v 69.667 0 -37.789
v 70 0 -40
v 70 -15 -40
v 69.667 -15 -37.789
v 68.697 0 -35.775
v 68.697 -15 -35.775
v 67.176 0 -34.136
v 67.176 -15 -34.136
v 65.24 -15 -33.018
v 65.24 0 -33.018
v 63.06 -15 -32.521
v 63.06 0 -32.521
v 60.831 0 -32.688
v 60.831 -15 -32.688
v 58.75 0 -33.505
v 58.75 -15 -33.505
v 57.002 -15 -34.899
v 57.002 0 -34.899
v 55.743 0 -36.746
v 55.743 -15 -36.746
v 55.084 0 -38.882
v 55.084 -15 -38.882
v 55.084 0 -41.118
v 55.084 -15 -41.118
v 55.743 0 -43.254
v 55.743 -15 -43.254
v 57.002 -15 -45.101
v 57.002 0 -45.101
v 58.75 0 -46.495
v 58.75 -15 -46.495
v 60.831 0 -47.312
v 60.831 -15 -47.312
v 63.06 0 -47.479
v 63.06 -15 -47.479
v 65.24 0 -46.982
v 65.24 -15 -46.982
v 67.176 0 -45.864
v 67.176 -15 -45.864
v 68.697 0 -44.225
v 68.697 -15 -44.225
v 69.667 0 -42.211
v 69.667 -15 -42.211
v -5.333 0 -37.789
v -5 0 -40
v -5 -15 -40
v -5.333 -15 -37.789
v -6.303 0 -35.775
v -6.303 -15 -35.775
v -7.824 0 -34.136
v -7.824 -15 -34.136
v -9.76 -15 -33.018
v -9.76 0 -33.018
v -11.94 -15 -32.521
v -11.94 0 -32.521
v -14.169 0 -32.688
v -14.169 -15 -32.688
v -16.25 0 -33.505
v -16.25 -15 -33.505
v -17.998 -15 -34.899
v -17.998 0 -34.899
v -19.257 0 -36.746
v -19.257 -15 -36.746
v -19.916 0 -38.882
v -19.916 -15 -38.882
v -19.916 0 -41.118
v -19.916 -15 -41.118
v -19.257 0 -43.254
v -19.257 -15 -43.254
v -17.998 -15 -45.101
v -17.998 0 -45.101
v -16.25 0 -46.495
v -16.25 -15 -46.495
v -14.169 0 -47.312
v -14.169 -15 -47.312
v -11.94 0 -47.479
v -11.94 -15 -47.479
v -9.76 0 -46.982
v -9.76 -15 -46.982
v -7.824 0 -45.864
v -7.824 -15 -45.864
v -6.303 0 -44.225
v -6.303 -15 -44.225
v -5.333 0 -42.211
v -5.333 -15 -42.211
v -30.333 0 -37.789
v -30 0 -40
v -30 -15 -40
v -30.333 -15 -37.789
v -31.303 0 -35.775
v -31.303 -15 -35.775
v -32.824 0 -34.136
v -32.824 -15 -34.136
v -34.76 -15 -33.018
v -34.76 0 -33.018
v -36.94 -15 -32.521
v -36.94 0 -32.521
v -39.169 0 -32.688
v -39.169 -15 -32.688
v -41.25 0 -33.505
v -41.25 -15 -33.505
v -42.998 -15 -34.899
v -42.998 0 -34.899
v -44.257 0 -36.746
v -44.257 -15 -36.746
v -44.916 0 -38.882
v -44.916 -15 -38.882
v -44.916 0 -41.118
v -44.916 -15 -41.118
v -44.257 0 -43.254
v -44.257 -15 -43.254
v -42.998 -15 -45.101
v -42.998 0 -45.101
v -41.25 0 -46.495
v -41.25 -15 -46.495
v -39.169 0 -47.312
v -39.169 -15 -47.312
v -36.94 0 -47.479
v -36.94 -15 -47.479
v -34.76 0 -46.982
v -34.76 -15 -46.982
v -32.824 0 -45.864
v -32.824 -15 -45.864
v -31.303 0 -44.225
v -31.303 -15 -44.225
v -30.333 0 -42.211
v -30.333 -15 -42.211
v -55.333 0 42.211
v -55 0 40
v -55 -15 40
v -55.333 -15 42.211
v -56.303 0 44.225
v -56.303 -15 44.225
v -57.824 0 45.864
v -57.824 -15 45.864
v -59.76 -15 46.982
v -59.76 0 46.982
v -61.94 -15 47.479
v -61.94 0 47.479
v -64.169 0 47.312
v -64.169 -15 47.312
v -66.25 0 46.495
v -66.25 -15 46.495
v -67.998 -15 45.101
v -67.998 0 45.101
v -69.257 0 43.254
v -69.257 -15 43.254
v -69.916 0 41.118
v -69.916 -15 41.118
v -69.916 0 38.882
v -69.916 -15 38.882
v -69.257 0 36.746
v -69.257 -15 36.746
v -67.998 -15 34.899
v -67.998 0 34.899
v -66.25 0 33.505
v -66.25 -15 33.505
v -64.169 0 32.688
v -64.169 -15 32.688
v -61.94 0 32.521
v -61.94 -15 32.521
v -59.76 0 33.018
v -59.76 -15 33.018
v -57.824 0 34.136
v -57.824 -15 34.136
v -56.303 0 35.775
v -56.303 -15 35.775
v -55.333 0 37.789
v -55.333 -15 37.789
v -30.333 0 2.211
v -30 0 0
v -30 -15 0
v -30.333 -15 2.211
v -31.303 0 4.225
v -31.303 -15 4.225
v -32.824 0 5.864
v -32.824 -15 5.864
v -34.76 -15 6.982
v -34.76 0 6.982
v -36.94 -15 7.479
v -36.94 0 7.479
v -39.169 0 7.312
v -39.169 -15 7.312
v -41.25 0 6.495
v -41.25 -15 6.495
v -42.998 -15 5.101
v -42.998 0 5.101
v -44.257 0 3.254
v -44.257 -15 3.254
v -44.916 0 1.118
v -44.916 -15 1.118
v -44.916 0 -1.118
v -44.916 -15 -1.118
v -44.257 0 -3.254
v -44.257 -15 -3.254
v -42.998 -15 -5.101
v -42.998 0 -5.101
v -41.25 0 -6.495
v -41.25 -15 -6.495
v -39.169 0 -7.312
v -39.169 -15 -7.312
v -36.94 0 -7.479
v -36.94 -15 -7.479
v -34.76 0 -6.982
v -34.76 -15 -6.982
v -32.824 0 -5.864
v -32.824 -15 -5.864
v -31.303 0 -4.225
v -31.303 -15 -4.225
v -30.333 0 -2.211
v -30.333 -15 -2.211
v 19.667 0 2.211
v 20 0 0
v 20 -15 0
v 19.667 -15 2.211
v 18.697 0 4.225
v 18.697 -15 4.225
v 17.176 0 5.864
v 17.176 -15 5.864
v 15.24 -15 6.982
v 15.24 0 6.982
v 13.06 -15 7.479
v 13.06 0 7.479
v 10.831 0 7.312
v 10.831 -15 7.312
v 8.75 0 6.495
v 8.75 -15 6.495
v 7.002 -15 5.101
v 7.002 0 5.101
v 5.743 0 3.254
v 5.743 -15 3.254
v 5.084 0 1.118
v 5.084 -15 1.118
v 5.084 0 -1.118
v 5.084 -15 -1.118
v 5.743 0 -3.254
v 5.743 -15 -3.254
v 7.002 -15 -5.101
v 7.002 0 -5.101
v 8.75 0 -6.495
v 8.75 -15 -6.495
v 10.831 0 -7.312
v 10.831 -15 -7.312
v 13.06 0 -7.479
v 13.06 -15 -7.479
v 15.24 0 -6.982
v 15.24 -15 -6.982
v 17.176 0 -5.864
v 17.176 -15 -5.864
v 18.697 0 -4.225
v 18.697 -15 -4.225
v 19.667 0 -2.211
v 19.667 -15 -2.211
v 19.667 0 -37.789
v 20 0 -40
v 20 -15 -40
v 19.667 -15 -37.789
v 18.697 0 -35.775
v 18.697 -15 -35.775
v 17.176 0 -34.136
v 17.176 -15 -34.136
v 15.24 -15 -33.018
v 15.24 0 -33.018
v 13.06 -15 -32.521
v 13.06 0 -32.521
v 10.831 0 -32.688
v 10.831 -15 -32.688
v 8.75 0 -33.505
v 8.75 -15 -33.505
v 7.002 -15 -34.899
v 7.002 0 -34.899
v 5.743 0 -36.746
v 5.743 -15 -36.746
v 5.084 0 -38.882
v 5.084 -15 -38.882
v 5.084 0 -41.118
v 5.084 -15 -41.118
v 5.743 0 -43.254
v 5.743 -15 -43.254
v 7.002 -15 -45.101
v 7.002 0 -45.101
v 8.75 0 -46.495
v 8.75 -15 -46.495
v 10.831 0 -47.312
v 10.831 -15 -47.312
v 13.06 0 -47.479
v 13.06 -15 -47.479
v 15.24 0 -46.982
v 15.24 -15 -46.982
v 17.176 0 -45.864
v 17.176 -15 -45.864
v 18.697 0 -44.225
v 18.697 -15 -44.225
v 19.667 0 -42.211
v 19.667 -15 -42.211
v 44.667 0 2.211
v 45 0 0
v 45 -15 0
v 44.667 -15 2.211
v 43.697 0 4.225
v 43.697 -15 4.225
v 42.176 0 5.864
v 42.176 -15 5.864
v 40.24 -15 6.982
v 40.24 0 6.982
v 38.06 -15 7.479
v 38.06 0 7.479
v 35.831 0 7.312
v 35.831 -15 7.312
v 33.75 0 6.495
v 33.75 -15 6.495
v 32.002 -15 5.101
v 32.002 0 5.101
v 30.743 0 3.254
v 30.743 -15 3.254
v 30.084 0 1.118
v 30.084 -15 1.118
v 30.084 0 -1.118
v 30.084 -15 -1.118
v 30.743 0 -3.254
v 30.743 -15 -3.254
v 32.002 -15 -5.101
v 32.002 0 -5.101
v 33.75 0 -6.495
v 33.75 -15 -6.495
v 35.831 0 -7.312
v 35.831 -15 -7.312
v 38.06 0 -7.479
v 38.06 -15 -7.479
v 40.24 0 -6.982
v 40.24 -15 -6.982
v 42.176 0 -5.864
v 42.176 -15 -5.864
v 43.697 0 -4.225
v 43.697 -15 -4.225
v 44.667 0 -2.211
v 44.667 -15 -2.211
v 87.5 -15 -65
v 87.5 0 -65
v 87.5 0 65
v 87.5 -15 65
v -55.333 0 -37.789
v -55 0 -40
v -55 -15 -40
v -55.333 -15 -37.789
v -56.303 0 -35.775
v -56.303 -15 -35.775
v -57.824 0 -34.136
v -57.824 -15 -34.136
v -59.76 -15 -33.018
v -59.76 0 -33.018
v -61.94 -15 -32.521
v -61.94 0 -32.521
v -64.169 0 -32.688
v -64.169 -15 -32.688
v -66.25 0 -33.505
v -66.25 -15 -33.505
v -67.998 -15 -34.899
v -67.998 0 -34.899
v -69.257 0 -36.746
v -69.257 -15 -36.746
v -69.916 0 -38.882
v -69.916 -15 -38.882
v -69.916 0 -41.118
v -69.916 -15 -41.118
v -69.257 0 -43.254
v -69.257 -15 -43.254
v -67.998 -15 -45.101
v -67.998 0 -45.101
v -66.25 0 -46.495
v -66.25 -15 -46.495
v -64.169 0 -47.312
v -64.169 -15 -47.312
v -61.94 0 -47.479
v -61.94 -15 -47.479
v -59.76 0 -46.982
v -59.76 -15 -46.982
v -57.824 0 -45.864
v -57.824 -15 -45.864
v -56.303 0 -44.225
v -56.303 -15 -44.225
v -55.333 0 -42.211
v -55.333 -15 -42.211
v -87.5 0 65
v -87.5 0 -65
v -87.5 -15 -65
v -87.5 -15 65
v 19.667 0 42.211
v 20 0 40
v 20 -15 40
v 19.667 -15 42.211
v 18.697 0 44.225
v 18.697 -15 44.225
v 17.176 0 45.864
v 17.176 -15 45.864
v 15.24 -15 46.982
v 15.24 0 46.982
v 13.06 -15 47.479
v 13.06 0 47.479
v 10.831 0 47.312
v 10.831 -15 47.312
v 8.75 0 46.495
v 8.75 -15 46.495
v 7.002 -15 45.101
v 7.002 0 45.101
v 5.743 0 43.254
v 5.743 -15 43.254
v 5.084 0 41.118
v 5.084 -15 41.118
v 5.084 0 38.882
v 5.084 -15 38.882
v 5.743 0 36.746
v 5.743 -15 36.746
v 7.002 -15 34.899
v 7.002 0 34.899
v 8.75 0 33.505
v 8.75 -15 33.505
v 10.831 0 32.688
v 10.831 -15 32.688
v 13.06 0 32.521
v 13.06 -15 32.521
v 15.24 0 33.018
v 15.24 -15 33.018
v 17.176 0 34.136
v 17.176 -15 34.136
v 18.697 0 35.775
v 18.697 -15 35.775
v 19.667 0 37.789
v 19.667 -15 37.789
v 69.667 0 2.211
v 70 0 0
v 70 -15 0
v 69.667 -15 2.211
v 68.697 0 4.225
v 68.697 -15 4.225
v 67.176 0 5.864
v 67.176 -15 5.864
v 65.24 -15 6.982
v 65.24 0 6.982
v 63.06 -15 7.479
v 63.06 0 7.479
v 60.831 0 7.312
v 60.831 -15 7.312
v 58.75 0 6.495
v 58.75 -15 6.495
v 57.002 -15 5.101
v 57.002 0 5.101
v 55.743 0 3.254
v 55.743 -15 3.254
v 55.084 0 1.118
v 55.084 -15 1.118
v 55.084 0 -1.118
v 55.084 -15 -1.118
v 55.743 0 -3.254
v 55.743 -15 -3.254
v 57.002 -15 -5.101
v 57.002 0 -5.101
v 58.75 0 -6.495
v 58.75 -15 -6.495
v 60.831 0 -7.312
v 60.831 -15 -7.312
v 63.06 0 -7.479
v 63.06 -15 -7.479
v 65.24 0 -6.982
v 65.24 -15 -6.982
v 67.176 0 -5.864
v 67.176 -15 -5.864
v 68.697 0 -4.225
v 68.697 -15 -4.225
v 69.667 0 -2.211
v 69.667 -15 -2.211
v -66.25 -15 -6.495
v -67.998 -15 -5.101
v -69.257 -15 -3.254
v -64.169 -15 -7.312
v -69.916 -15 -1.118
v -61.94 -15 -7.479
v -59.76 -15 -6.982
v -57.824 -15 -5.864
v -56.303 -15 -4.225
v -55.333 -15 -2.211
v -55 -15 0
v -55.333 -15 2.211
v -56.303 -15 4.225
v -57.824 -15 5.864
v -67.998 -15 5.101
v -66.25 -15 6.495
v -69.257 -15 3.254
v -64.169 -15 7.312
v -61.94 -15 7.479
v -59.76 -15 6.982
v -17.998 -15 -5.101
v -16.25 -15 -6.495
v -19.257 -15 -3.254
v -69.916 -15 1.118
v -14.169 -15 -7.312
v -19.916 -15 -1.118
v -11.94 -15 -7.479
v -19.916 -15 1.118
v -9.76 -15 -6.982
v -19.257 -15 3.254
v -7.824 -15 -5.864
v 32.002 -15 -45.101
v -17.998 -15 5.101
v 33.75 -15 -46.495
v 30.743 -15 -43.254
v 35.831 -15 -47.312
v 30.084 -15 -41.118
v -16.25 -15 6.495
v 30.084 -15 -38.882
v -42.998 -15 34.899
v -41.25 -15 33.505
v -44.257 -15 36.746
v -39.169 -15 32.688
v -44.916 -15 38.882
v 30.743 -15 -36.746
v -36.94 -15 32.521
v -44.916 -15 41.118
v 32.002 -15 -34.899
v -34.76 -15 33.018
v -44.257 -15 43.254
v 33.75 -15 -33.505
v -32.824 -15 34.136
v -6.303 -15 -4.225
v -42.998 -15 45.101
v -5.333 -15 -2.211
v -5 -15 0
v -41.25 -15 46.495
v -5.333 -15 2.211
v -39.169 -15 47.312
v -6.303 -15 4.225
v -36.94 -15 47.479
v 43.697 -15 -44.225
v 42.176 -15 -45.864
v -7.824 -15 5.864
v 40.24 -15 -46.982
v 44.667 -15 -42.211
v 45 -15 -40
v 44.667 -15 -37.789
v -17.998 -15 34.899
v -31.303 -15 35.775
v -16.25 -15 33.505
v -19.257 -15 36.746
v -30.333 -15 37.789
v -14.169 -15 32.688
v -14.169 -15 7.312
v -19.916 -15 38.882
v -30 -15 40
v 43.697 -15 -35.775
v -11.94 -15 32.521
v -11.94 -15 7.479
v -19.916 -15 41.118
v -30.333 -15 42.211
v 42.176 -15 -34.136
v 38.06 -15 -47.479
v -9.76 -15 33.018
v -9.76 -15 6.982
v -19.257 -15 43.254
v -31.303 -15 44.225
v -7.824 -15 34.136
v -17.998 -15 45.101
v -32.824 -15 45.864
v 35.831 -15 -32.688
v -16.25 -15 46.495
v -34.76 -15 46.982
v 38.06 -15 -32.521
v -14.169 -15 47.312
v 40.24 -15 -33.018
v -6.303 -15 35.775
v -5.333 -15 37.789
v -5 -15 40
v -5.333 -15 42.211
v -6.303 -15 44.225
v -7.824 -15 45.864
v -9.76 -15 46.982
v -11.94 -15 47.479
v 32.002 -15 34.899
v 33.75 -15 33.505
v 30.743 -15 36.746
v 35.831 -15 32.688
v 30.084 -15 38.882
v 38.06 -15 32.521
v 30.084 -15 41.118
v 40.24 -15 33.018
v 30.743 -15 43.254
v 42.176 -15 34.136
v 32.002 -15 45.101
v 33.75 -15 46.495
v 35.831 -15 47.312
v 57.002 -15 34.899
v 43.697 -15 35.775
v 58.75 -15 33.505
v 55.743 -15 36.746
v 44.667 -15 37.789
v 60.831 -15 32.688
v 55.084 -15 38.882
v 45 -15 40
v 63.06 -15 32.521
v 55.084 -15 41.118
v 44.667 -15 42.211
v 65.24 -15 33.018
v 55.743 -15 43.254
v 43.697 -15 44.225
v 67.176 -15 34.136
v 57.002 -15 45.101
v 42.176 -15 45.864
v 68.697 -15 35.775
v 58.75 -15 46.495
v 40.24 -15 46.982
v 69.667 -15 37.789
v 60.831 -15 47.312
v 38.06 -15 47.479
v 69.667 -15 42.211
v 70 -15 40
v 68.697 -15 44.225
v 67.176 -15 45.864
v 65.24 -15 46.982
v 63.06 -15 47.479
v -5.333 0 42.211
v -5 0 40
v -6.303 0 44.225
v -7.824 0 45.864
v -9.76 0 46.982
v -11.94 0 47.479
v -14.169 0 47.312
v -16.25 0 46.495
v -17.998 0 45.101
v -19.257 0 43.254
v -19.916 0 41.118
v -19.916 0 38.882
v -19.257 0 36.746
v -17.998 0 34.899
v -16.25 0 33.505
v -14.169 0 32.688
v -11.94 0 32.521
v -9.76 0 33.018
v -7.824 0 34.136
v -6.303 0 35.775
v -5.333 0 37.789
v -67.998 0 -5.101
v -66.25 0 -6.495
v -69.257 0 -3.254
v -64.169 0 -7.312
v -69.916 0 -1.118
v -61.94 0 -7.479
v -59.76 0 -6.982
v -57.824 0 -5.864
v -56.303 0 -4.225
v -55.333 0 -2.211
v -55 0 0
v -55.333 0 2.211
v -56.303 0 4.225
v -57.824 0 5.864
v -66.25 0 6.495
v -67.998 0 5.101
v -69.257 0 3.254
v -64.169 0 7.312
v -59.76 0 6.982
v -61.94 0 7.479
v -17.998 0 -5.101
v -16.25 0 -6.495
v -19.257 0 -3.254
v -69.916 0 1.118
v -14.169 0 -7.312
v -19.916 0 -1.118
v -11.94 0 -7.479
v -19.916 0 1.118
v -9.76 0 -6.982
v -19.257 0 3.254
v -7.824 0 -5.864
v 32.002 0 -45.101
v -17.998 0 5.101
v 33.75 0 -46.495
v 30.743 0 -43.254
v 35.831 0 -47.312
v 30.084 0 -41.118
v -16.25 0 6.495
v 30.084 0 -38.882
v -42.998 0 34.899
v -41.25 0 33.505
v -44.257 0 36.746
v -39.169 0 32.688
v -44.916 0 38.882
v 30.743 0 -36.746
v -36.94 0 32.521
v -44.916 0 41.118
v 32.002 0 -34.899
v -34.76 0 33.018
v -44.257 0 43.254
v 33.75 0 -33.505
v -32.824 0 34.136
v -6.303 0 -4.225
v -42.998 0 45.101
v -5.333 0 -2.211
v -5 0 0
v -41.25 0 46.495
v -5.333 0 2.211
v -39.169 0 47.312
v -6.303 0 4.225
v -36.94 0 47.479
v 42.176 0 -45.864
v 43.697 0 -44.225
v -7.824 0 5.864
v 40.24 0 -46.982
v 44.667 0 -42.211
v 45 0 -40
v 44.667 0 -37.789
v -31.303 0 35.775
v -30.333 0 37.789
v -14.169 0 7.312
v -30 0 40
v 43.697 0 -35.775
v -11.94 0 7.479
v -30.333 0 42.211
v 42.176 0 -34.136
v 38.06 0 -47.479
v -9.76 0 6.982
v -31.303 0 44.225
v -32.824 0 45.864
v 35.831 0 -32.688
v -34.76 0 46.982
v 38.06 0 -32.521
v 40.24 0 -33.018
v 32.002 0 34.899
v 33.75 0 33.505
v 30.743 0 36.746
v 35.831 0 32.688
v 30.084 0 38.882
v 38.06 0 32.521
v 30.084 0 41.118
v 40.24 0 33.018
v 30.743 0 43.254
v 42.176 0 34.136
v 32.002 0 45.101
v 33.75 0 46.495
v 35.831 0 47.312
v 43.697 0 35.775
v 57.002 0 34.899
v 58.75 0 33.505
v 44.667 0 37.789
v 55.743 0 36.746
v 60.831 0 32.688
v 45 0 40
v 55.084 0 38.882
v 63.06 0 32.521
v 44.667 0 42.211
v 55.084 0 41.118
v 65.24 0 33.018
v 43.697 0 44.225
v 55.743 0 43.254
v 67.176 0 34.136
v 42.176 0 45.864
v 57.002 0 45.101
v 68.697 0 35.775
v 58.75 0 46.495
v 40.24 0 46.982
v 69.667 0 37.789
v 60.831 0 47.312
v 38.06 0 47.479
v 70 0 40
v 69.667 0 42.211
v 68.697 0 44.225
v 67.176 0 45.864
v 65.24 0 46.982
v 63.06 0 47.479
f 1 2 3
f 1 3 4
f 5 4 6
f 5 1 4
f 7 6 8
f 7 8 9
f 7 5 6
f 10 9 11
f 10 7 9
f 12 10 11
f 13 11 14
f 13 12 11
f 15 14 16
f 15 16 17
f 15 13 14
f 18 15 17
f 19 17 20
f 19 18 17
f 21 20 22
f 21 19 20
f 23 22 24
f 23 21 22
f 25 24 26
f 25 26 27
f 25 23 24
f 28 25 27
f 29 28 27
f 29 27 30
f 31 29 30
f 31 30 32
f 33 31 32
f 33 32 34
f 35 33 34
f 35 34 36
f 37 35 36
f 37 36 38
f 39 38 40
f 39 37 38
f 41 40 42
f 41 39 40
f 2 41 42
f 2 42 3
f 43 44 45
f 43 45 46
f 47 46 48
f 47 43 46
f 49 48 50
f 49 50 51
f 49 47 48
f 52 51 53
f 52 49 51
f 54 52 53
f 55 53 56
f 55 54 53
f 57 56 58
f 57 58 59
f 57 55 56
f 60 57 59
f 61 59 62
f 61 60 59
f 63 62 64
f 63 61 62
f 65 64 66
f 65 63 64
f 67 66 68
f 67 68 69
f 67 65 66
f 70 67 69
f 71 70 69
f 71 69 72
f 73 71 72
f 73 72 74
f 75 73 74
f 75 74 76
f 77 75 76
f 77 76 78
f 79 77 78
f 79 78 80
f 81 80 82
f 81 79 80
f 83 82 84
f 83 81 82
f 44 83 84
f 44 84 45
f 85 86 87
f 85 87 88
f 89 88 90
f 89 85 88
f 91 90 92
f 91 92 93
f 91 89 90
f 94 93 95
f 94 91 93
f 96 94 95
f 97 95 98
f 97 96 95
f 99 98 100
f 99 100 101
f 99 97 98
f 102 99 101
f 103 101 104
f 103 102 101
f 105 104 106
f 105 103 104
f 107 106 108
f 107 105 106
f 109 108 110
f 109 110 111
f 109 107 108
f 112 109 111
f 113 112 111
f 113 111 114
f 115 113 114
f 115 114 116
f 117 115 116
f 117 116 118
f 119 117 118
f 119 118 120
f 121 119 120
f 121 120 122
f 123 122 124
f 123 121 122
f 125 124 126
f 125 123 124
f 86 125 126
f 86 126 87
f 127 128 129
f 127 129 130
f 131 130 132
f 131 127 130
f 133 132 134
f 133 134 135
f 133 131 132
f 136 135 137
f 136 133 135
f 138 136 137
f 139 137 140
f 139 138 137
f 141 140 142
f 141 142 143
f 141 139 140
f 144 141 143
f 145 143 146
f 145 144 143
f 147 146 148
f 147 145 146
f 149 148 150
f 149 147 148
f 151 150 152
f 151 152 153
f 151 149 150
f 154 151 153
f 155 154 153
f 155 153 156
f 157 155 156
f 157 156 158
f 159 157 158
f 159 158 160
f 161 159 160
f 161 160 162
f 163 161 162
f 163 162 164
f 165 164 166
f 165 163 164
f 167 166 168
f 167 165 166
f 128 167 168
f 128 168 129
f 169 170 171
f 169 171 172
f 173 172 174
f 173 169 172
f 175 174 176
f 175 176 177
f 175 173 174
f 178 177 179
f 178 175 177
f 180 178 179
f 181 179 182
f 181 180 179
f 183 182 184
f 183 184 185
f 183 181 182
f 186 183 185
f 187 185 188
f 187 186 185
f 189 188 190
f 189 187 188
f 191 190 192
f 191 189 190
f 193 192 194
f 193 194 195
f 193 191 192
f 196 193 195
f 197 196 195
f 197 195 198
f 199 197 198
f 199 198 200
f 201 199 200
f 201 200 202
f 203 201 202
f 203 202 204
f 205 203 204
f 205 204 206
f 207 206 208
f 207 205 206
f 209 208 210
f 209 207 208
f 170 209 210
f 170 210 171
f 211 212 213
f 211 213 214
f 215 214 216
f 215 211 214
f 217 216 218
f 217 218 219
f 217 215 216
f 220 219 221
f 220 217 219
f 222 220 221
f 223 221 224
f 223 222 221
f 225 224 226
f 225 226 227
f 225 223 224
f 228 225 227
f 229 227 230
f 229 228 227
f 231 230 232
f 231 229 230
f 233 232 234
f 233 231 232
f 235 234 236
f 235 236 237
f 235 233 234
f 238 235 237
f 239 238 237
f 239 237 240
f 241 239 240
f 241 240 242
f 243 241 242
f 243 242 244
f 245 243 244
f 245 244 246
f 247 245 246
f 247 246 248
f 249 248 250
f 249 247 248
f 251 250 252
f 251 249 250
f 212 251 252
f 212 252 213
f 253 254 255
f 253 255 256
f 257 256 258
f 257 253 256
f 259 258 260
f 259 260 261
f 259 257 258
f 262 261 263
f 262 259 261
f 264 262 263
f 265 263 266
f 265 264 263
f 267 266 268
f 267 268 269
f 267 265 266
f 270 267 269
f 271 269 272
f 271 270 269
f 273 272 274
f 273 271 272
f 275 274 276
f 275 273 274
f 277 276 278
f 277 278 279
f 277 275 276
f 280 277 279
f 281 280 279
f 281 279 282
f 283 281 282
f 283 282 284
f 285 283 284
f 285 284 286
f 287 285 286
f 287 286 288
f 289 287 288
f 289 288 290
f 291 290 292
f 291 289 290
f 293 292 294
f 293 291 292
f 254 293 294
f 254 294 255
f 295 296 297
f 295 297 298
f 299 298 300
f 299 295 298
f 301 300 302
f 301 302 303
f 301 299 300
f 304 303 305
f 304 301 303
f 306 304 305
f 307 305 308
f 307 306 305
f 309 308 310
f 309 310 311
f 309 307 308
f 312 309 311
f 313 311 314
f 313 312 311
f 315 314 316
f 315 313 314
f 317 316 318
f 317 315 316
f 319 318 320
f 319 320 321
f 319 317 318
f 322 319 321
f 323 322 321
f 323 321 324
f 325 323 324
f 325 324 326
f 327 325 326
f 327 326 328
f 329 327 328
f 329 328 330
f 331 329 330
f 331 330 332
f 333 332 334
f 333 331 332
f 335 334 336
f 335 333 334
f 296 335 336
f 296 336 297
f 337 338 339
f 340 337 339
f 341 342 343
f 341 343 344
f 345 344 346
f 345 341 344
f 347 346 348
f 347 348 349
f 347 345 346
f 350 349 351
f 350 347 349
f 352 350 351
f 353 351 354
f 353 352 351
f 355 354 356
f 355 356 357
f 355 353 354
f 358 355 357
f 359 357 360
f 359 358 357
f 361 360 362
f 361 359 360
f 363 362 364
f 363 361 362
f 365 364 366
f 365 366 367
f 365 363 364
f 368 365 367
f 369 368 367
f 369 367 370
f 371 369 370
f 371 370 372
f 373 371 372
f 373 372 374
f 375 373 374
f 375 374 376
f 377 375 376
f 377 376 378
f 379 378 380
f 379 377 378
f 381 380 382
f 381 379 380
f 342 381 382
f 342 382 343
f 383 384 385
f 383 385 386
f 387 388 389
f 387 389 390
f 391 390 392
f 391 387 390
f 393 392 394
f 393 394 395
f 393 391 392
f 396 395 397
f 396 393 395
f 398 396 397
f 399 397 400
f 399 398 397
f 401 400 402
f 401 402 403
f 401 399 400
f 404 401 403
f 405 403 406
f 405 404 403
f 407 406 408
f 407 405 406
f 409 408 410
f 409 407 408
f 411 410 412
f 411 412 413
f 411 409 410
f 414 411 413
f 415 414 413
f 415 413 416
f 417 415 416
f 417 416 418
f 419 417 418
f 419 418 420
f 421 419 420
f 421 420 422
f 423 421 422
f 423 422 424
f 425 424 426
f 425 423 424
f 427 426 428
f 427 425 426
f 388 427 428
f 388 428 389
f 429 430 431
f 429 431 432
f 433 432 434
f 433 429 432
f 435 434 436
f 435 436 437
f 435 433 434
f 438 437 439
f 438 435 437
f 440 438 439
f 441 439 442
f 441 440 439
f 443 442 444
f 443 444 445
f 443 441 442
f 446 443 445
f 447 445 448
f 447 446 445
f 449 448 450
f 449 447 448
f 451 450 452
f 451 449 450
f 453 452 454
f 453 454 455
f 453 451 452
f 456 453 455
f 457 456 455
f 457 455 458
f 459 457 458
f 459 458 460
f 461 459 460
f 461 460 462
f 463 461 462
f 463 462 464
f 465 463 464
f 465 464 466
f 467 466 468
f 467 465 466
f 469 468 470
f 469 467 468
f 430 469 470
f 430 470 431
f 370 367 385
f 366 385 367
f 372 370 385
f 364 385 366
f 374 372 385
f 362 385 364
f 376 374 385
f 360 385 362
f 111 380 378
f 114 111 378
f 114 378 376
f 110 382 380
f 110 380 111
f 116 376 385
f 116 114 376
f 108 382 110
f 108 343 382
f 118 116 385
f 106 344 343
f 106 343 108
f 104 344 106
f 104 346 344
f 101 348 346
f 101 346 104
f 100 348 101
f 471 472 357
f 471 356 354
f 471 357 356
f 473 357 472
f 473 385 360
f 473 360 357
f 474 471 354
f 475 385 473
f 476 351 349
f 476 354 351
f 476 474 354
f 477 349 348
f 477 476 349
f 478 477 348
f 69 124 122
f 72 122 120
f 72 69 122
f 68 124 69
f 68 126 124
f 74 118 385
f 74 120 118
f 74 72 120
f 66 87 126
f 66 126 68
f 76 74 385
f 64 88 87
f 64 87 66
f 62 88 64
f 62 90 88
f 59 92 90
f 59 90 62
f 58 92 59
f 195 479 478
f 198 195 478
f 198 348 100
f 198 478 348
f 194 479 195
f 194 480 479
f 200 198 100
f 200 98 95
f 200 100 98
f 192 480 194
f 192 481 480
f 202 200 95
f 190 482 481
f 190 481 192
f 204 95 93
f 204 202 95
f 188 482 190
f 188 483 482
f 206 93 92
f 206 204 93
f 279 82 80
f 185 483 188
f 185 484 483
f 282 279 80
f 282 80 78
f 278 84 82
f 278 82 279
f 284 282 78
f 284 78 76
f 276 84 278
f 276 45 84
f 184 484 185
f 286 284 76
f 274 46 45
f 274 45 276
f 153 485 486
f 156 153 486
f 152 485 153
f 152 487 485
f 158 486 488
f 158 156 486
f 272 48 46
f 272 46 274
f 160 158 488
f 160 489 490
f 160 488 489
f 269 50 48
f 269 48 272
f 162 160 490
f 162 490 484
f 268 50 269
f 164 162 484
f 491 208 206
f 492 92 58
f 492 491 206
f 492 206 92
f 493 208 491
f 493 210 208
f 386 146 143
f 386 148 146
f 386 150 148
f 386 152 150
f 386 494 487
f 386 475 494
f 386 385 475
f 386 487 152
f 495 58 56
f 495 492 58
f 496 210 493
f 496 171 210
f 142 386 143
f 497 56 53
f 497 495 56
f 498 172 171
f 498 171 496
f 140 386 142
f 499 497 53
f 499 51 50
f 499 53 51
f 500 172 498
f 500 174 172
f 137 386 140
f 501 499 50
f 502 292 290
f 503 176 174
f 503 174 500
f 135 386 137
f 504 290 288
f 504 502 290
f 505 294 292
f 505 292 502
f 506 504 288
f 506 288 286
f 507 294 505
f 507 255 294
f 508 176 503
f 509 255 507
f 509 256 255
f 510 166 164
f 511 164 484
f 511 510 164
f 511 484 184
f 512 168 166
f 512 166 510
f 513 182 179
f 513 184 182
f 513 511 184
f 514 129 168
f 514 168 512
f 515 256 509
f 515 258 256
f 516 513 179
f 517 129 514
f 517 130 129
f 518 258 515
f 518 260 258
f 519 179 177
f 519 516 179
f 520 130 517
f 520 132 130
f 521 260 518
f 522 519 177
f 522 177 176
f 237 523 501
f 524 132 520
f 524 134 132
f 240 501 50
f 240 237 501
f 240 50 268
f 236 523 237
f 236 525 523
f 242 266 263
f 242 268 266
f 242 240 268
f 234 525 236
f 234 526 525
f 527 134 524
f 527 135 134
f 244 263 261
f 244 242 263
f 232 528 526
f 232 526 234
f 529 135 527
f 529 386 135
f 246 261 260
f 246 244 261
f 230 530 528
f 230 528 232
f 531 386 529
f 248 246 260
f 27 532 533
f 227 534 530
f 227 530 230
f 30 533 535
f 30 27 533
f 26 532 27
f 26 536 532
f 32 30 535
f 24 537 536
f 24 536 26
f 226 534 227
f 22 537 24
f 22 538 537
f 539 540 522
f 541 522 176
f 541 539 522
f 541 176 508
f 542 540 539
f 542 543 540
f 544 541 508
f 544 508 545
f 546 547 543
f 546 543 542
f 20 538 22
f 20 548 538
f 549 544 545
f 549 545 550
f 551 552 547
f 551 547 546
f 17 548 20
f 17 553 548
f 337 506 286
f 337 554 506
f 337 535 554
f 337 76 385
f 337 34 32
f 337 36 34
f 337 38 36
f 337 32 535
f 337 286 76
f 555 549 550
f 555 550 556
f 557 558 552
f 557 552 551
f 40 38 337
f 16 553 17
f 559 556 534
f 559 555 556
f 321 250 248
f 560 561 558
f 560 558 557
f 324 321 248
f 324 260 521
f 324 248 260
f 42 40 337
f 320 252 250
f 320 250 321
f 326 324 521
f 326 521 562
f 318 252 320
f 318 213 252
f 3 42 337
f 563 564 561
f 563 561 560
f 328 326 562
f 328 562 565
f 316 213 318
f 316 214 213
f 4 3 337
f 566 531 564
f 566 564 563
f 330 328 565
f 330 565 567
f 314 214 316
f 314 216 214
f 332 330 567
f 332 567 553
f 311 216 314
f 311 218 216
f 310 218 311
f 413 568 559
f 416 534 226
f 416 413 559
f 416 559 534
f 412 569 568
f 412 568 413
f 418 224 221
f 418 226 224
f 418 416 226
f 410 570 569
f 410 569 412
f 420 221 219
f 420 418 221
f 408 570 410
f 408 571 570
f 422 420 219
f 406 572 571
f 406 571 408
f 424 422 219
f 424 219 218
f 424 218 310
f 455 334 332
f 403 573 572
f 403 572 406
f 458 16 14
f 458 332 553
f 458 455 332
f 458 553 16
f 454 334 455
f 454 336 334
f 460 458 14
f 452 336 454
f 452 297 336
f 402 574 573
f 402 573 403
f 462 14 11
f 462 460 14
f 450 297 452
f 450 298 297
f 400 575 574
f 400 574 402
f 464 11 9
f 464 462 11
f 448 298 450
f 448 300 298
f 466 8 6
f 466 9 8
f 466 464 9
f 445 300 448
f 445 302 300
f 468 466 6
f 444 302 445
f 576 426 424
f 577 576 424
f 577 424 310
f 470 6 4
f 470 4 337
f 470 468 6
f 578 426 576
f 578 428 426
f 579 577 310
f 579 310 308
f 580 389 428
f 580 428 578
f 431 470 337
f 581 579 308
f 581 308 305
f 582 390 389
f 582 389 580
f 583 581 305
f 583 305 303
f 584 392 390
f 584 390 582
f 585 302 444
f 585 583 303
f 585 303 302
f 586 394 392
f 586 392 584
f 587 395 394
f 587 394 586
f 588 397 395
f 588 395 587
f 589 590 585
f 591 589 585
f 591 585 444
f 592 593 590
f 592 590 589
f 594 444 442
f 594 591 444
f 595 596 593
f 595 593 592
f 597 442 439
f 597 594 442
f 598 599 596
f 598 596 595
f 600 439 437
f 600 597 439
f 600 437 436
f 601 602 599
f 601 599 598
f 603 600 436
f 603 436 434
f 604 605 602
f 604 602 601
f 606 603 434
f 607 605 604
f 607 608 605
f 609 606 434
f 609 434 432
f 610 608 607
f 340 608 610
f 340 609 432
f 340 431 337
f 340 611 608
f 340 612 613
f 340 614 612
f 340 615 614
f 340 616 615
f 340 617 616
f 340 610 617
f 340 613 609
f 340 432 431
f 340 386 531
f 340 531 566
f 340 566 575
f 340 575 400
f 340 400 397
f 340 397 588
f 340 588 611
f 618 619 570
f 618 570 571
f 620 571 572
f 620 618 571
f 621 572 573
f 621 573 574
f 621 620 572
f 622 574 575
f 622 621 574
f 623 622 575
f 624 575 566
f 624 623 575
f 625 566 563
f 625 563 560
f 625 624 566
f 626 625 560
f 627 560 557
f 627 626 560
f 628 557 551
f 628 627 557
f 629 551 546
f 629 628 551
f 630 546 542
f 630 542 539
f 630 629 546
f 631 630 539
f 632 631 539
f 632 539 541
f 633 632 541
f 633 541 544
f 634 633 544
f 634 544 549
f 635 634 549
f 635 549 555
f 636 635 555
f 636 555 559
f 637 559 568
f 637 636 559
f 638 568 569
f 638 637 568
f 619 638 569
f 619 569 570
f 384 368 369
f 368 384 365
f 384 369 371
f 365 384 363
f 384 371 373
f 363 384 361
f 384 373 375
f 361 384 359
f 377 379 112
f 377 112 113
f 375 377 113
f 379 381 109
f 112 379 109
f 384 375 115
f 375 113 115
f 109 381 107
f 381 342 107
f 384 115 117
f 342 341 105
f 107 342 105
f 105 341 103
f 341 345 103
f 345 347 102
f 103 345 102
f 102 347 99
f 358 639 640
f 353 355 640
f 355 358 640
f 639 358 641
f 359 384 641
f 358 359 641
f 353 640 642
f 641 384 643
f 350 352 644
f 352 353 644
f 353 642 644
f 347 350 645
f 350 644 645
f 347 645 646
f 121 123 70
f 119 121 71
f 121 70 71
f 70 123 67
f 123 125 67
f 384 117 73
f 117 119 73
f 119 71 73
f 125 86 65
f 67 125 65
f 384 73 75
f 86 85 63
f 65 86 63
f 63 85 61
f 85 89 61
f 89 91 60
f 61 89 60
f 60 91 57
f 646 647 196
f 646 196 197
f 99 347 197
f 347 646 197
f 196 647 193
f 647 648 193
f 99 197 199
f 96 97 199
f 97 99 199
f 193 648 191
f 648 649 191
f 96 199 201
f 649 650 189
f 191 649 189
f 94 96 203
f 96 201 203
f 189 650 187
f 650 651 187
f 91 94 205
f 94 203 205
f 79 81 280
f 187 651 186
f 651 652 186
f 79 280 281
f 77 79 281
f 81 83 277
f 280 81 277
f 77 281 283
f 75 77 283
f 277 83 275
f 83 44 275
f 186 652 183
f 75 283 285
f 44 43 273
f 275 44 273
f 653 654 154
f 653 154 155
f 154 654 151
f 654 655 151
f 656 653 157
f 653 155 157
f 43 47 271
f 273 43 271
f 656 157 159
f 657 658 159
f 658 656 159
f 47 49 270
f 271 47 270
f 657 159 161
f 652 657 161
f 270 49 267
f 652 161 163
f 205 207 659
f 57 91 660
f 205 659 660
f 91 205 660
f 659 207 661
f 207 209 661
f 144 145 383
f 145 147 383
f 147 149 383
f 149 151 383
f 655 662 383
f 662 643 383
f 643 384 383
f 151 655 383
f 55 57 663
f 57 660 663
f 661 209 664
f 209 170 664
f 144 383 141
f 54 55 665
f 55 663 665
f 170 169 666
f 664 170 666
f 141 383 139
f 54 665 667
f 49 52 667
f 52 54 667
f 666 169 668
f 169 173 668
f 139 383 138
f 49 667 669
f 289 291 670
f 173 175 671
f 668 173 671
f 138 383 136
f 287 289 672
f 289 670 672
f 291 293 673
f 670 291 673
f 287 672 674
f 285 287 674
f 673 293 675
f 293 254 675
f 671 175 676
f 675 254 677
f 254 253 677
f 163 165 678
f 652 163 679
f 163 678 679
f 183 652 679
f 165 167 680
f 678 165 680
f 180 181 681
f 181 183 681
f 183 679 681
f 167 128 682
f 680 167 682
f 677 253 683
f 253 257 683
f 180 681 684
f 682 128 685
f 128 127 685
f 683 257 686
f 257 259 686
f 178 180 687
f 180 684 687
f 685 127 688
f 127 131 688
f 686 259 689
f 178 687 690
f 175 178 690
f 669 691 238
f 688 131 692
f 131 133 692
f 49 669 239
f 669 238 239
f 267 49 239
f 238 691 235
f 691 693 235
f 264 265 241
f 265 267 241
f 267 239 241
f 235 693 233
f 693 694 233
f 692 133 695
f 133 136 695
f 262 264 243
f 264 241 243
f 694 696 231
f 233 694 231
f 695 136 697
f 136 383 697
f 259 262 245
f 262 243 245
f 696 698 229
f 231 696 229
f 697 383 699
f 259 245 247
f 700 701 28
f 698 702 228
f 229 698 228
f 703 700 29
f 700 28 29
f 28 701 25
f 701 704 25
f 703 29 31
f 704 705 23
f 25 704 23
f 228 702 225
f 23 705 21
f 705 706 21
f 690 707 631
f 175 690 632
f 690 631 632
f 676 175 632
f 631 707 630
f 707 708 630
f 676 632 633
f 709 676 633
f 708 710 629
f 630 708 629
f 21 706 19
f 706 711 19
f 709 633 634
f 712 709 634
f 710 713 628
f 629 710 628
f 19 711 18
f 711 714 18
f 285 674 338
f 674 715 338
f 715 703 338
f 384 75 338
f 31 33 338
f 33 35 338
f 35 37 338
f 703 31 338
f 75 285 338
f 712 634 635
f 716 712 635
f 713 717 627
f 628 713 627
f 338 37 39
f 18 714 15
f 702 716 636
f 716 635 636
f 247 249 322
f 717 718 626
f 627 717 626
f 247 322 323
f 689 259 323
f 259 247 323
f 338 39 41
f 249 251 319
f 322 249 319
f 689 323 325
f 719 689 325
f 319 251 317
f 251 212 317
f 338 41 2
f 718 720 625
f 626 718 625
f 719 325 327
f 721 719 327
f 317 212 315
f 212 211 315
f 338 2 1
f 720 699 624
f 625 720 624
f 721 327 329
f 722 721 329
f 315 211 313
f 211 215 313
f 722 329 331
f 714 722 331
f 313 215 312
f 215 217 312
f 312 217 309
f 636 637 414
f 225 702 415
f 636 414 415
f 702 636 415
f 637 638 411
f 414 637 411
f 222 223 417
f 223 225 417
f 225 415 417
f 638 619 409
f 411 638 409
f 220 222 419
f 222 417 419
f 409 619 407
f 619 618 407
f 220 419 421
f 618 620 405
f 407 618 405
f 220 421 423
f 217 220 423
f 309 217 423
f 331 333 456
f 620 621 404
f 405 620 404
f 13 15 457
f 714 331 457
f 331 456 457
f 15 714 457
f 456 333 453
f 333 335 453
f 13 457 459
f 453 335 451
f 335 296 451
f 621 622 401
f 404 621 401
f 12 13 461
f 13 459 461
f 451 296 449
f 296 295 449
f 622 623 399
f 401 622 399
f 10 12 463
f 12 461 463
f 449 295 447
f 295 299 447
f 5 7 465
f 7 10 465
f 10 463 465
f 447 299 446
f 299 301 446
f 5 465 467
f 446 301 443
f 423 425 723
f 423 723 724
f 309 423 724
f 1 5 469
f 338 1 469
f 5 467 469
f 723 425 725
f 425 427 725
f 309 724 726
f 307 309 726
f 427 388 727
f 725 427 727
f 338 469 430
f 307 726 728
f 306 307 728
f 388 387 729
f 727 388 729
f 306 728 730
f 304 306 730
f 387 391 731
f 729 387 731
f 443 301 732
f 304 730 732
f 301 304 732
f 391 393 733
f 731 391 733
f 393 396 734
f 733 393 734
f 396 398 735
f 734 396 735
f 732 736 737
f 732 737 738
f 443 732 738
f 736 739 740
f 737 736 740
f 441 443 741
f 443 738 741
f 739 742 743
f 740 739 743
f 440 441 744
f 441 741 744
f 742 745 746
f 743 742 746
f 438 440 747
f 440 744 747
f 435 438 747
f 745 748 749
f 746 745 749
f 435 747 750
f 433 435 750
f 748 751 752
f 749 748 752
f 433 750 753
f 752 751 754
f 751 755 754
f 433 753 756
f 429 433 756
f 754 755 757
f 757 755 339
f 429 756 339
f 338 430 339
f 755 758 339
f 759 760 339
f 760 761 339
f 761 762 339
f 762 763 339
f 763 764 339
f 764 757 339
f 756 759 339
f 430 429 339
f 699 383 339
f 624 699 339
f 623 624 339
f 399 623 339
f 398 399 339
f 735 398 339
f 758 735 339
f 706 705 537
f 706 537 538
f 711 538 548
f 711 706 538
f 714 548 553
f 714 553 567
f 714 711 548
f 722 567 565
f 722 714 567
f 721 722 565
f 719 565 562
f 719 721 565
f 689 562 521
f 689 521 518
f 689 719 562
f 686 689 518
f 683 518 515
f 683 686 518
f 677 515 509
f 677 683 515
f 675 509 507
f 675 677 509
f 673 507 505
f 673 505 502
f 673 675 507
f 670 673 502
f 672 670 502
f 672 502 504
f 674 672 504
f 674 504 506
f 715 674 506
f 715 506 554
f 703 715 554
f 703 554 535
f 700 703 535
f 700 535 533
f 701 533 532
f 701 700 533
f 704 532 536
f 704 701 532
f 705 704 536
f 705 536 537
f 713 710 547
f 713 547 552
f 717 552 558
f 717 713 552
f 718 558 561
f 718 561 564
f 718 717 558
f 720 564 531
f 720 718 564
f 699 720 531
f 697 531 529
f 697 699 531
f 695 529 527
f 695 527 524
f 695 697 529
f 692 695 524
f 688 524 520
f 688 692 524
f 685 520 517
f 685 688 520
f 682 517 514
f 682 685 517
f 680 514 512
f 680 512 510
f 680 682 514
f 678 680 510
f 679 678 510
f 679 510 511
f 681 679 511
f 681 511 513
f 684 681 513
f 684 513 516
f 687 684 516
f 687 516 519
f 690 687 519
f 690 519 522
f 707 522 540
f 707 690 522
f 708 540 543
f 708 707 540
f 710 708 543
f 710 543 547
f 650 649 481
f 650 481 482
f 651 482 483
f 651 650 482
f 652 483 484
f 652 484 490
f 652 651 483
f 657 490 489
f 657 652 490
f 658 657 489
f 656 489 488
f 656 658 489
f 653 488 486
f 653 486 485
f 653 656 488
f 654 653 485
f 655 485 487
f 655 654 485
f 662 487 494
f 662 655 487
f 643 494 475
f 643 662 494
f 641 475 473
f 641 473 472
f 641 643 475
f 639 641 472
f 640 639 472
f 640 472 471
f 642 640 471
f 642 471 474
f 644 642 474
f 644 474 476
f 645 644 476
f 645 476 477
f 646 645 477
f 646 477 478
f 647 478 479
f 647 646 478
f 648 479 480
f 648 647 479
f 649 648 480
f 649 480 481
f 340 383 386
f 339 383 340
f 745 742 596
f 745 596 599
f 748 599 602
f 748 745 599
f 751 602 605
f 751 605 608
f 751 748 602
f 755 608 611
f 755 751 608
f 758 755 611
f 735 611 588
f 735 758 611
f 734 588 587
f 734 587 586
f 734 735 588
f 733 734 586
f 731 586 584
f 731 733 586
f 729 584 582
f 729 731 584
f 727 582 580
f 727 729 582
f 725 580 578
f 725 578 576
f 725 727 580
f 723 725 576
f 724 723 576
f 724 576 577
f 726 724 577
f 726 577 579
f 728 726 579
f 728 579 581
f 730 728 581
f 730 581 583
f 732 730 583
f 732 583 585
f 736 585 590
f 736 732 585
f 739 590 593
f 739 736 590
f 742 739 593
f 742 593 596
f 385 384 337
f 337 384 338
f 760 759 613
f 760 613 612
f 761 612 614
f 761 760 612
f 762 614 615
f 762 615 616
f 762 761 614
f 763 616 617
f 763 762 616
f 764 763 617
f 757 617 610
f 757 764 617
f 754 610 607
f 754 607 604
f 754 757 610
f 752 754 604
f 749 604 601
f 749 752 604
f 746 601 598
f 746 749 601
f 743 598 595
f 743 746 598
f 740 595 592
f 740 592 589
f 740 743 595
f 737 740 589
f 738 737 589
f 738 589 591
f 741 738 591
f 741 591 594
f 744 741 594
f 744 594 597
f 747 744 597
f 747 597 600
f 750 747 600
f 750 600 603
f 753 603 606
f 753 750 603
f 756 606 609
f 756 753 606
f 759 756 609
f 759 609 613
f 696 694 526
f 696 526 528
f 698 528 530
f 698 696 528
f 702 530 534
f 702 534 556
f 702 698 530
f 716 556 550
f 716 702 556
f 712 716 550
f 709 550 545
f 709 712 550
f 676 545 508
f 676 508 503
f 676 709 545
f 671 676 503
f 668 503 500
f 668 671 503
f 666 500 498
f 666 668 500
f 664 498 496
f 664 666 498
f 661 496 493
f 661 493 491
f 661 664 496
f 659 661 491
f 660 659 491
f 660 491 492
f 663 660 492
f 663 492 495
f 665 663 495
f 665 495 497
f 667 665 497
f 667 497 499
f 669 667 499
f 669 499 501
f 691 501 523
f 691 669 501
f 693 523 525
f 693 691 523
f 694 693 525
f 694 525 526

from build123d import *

# Parameters (mm, degrees)
F0_W     = 175
F0_H     = 130
F0_R     = 7.5
F1_DEPTH = 15


with BuildPart() as f1:
    # F0 (on Front) → F1 (new body)
    with BuildSketch(Plane.XZ):
        Rectangle(F0_W, F0_H)
        with Locations((-62.5, -40)):
            Circle(F0_R, mode=Mode.SUBTRACT)
        with Locations((-37.5, -40)):
            Circle(F0_R, mode=Mode.SUBTRACT)
        with Locations((-12.5, -40)):
            Circle(F0_R, mode=Mode.SUBTRACT)
        with Locations((12.5, -40)):
            Circle(F0_R, mode=Mode.SUBTRACT)
        with Locations((37.5, -40)):
            Circle(F0_R, mode=Mode.SUBTRACT)
        with Locations((62.5, -40)):
            Circle(F0_R, mode=Mode.SUBTRACT)
        with Locations((-62.5, 0)):
            Circle(F0_R, mode=Mode.SUBTRACT)
        with Locations((-37.5, 0)):
            Circle(F0_R, mode=Mode.SUBTRACT)
        with Locations((-12.5, 0)):
            Circle(F0_R, mode=Mode.SUBTRACT)
        with Locations((-62.5, 40)):
            Circle(F0_R, mode=Mode.SUBTRACT)
        with Locations((-37.5, 40)):
            Circle(F0_R, mode=Mode.SUBTRACT)
        with Locations((-12.5, 40)):
            Circle(F0_R, mode=Mode.SUBTRACT)
        with Locations((12.5, 0)):
            Circle(F0_R, mode=Mode.SUBTRACT)
        with Locations((37.5, 0)):
            Circle(F0_R, mode=Mode.SUBTRACT)
        with Locations((62.5, 0)):
            Circle(F0_R, mode=Mode.SUBTRACT)
        with Locations((12.5, 40)):
            Circle(F0_R, mode=Mode.SUBTRACT)
        with Locations((37.5, 40)):
            Circle(F0_R, mode=Mode.SUBTRACT)
        with Locations((62.5, 40)):
            Circle(F0_R, mode=Mode.SUBTRACT)
    extrude(amount=F1_DEPTH)


solid = f1.part
